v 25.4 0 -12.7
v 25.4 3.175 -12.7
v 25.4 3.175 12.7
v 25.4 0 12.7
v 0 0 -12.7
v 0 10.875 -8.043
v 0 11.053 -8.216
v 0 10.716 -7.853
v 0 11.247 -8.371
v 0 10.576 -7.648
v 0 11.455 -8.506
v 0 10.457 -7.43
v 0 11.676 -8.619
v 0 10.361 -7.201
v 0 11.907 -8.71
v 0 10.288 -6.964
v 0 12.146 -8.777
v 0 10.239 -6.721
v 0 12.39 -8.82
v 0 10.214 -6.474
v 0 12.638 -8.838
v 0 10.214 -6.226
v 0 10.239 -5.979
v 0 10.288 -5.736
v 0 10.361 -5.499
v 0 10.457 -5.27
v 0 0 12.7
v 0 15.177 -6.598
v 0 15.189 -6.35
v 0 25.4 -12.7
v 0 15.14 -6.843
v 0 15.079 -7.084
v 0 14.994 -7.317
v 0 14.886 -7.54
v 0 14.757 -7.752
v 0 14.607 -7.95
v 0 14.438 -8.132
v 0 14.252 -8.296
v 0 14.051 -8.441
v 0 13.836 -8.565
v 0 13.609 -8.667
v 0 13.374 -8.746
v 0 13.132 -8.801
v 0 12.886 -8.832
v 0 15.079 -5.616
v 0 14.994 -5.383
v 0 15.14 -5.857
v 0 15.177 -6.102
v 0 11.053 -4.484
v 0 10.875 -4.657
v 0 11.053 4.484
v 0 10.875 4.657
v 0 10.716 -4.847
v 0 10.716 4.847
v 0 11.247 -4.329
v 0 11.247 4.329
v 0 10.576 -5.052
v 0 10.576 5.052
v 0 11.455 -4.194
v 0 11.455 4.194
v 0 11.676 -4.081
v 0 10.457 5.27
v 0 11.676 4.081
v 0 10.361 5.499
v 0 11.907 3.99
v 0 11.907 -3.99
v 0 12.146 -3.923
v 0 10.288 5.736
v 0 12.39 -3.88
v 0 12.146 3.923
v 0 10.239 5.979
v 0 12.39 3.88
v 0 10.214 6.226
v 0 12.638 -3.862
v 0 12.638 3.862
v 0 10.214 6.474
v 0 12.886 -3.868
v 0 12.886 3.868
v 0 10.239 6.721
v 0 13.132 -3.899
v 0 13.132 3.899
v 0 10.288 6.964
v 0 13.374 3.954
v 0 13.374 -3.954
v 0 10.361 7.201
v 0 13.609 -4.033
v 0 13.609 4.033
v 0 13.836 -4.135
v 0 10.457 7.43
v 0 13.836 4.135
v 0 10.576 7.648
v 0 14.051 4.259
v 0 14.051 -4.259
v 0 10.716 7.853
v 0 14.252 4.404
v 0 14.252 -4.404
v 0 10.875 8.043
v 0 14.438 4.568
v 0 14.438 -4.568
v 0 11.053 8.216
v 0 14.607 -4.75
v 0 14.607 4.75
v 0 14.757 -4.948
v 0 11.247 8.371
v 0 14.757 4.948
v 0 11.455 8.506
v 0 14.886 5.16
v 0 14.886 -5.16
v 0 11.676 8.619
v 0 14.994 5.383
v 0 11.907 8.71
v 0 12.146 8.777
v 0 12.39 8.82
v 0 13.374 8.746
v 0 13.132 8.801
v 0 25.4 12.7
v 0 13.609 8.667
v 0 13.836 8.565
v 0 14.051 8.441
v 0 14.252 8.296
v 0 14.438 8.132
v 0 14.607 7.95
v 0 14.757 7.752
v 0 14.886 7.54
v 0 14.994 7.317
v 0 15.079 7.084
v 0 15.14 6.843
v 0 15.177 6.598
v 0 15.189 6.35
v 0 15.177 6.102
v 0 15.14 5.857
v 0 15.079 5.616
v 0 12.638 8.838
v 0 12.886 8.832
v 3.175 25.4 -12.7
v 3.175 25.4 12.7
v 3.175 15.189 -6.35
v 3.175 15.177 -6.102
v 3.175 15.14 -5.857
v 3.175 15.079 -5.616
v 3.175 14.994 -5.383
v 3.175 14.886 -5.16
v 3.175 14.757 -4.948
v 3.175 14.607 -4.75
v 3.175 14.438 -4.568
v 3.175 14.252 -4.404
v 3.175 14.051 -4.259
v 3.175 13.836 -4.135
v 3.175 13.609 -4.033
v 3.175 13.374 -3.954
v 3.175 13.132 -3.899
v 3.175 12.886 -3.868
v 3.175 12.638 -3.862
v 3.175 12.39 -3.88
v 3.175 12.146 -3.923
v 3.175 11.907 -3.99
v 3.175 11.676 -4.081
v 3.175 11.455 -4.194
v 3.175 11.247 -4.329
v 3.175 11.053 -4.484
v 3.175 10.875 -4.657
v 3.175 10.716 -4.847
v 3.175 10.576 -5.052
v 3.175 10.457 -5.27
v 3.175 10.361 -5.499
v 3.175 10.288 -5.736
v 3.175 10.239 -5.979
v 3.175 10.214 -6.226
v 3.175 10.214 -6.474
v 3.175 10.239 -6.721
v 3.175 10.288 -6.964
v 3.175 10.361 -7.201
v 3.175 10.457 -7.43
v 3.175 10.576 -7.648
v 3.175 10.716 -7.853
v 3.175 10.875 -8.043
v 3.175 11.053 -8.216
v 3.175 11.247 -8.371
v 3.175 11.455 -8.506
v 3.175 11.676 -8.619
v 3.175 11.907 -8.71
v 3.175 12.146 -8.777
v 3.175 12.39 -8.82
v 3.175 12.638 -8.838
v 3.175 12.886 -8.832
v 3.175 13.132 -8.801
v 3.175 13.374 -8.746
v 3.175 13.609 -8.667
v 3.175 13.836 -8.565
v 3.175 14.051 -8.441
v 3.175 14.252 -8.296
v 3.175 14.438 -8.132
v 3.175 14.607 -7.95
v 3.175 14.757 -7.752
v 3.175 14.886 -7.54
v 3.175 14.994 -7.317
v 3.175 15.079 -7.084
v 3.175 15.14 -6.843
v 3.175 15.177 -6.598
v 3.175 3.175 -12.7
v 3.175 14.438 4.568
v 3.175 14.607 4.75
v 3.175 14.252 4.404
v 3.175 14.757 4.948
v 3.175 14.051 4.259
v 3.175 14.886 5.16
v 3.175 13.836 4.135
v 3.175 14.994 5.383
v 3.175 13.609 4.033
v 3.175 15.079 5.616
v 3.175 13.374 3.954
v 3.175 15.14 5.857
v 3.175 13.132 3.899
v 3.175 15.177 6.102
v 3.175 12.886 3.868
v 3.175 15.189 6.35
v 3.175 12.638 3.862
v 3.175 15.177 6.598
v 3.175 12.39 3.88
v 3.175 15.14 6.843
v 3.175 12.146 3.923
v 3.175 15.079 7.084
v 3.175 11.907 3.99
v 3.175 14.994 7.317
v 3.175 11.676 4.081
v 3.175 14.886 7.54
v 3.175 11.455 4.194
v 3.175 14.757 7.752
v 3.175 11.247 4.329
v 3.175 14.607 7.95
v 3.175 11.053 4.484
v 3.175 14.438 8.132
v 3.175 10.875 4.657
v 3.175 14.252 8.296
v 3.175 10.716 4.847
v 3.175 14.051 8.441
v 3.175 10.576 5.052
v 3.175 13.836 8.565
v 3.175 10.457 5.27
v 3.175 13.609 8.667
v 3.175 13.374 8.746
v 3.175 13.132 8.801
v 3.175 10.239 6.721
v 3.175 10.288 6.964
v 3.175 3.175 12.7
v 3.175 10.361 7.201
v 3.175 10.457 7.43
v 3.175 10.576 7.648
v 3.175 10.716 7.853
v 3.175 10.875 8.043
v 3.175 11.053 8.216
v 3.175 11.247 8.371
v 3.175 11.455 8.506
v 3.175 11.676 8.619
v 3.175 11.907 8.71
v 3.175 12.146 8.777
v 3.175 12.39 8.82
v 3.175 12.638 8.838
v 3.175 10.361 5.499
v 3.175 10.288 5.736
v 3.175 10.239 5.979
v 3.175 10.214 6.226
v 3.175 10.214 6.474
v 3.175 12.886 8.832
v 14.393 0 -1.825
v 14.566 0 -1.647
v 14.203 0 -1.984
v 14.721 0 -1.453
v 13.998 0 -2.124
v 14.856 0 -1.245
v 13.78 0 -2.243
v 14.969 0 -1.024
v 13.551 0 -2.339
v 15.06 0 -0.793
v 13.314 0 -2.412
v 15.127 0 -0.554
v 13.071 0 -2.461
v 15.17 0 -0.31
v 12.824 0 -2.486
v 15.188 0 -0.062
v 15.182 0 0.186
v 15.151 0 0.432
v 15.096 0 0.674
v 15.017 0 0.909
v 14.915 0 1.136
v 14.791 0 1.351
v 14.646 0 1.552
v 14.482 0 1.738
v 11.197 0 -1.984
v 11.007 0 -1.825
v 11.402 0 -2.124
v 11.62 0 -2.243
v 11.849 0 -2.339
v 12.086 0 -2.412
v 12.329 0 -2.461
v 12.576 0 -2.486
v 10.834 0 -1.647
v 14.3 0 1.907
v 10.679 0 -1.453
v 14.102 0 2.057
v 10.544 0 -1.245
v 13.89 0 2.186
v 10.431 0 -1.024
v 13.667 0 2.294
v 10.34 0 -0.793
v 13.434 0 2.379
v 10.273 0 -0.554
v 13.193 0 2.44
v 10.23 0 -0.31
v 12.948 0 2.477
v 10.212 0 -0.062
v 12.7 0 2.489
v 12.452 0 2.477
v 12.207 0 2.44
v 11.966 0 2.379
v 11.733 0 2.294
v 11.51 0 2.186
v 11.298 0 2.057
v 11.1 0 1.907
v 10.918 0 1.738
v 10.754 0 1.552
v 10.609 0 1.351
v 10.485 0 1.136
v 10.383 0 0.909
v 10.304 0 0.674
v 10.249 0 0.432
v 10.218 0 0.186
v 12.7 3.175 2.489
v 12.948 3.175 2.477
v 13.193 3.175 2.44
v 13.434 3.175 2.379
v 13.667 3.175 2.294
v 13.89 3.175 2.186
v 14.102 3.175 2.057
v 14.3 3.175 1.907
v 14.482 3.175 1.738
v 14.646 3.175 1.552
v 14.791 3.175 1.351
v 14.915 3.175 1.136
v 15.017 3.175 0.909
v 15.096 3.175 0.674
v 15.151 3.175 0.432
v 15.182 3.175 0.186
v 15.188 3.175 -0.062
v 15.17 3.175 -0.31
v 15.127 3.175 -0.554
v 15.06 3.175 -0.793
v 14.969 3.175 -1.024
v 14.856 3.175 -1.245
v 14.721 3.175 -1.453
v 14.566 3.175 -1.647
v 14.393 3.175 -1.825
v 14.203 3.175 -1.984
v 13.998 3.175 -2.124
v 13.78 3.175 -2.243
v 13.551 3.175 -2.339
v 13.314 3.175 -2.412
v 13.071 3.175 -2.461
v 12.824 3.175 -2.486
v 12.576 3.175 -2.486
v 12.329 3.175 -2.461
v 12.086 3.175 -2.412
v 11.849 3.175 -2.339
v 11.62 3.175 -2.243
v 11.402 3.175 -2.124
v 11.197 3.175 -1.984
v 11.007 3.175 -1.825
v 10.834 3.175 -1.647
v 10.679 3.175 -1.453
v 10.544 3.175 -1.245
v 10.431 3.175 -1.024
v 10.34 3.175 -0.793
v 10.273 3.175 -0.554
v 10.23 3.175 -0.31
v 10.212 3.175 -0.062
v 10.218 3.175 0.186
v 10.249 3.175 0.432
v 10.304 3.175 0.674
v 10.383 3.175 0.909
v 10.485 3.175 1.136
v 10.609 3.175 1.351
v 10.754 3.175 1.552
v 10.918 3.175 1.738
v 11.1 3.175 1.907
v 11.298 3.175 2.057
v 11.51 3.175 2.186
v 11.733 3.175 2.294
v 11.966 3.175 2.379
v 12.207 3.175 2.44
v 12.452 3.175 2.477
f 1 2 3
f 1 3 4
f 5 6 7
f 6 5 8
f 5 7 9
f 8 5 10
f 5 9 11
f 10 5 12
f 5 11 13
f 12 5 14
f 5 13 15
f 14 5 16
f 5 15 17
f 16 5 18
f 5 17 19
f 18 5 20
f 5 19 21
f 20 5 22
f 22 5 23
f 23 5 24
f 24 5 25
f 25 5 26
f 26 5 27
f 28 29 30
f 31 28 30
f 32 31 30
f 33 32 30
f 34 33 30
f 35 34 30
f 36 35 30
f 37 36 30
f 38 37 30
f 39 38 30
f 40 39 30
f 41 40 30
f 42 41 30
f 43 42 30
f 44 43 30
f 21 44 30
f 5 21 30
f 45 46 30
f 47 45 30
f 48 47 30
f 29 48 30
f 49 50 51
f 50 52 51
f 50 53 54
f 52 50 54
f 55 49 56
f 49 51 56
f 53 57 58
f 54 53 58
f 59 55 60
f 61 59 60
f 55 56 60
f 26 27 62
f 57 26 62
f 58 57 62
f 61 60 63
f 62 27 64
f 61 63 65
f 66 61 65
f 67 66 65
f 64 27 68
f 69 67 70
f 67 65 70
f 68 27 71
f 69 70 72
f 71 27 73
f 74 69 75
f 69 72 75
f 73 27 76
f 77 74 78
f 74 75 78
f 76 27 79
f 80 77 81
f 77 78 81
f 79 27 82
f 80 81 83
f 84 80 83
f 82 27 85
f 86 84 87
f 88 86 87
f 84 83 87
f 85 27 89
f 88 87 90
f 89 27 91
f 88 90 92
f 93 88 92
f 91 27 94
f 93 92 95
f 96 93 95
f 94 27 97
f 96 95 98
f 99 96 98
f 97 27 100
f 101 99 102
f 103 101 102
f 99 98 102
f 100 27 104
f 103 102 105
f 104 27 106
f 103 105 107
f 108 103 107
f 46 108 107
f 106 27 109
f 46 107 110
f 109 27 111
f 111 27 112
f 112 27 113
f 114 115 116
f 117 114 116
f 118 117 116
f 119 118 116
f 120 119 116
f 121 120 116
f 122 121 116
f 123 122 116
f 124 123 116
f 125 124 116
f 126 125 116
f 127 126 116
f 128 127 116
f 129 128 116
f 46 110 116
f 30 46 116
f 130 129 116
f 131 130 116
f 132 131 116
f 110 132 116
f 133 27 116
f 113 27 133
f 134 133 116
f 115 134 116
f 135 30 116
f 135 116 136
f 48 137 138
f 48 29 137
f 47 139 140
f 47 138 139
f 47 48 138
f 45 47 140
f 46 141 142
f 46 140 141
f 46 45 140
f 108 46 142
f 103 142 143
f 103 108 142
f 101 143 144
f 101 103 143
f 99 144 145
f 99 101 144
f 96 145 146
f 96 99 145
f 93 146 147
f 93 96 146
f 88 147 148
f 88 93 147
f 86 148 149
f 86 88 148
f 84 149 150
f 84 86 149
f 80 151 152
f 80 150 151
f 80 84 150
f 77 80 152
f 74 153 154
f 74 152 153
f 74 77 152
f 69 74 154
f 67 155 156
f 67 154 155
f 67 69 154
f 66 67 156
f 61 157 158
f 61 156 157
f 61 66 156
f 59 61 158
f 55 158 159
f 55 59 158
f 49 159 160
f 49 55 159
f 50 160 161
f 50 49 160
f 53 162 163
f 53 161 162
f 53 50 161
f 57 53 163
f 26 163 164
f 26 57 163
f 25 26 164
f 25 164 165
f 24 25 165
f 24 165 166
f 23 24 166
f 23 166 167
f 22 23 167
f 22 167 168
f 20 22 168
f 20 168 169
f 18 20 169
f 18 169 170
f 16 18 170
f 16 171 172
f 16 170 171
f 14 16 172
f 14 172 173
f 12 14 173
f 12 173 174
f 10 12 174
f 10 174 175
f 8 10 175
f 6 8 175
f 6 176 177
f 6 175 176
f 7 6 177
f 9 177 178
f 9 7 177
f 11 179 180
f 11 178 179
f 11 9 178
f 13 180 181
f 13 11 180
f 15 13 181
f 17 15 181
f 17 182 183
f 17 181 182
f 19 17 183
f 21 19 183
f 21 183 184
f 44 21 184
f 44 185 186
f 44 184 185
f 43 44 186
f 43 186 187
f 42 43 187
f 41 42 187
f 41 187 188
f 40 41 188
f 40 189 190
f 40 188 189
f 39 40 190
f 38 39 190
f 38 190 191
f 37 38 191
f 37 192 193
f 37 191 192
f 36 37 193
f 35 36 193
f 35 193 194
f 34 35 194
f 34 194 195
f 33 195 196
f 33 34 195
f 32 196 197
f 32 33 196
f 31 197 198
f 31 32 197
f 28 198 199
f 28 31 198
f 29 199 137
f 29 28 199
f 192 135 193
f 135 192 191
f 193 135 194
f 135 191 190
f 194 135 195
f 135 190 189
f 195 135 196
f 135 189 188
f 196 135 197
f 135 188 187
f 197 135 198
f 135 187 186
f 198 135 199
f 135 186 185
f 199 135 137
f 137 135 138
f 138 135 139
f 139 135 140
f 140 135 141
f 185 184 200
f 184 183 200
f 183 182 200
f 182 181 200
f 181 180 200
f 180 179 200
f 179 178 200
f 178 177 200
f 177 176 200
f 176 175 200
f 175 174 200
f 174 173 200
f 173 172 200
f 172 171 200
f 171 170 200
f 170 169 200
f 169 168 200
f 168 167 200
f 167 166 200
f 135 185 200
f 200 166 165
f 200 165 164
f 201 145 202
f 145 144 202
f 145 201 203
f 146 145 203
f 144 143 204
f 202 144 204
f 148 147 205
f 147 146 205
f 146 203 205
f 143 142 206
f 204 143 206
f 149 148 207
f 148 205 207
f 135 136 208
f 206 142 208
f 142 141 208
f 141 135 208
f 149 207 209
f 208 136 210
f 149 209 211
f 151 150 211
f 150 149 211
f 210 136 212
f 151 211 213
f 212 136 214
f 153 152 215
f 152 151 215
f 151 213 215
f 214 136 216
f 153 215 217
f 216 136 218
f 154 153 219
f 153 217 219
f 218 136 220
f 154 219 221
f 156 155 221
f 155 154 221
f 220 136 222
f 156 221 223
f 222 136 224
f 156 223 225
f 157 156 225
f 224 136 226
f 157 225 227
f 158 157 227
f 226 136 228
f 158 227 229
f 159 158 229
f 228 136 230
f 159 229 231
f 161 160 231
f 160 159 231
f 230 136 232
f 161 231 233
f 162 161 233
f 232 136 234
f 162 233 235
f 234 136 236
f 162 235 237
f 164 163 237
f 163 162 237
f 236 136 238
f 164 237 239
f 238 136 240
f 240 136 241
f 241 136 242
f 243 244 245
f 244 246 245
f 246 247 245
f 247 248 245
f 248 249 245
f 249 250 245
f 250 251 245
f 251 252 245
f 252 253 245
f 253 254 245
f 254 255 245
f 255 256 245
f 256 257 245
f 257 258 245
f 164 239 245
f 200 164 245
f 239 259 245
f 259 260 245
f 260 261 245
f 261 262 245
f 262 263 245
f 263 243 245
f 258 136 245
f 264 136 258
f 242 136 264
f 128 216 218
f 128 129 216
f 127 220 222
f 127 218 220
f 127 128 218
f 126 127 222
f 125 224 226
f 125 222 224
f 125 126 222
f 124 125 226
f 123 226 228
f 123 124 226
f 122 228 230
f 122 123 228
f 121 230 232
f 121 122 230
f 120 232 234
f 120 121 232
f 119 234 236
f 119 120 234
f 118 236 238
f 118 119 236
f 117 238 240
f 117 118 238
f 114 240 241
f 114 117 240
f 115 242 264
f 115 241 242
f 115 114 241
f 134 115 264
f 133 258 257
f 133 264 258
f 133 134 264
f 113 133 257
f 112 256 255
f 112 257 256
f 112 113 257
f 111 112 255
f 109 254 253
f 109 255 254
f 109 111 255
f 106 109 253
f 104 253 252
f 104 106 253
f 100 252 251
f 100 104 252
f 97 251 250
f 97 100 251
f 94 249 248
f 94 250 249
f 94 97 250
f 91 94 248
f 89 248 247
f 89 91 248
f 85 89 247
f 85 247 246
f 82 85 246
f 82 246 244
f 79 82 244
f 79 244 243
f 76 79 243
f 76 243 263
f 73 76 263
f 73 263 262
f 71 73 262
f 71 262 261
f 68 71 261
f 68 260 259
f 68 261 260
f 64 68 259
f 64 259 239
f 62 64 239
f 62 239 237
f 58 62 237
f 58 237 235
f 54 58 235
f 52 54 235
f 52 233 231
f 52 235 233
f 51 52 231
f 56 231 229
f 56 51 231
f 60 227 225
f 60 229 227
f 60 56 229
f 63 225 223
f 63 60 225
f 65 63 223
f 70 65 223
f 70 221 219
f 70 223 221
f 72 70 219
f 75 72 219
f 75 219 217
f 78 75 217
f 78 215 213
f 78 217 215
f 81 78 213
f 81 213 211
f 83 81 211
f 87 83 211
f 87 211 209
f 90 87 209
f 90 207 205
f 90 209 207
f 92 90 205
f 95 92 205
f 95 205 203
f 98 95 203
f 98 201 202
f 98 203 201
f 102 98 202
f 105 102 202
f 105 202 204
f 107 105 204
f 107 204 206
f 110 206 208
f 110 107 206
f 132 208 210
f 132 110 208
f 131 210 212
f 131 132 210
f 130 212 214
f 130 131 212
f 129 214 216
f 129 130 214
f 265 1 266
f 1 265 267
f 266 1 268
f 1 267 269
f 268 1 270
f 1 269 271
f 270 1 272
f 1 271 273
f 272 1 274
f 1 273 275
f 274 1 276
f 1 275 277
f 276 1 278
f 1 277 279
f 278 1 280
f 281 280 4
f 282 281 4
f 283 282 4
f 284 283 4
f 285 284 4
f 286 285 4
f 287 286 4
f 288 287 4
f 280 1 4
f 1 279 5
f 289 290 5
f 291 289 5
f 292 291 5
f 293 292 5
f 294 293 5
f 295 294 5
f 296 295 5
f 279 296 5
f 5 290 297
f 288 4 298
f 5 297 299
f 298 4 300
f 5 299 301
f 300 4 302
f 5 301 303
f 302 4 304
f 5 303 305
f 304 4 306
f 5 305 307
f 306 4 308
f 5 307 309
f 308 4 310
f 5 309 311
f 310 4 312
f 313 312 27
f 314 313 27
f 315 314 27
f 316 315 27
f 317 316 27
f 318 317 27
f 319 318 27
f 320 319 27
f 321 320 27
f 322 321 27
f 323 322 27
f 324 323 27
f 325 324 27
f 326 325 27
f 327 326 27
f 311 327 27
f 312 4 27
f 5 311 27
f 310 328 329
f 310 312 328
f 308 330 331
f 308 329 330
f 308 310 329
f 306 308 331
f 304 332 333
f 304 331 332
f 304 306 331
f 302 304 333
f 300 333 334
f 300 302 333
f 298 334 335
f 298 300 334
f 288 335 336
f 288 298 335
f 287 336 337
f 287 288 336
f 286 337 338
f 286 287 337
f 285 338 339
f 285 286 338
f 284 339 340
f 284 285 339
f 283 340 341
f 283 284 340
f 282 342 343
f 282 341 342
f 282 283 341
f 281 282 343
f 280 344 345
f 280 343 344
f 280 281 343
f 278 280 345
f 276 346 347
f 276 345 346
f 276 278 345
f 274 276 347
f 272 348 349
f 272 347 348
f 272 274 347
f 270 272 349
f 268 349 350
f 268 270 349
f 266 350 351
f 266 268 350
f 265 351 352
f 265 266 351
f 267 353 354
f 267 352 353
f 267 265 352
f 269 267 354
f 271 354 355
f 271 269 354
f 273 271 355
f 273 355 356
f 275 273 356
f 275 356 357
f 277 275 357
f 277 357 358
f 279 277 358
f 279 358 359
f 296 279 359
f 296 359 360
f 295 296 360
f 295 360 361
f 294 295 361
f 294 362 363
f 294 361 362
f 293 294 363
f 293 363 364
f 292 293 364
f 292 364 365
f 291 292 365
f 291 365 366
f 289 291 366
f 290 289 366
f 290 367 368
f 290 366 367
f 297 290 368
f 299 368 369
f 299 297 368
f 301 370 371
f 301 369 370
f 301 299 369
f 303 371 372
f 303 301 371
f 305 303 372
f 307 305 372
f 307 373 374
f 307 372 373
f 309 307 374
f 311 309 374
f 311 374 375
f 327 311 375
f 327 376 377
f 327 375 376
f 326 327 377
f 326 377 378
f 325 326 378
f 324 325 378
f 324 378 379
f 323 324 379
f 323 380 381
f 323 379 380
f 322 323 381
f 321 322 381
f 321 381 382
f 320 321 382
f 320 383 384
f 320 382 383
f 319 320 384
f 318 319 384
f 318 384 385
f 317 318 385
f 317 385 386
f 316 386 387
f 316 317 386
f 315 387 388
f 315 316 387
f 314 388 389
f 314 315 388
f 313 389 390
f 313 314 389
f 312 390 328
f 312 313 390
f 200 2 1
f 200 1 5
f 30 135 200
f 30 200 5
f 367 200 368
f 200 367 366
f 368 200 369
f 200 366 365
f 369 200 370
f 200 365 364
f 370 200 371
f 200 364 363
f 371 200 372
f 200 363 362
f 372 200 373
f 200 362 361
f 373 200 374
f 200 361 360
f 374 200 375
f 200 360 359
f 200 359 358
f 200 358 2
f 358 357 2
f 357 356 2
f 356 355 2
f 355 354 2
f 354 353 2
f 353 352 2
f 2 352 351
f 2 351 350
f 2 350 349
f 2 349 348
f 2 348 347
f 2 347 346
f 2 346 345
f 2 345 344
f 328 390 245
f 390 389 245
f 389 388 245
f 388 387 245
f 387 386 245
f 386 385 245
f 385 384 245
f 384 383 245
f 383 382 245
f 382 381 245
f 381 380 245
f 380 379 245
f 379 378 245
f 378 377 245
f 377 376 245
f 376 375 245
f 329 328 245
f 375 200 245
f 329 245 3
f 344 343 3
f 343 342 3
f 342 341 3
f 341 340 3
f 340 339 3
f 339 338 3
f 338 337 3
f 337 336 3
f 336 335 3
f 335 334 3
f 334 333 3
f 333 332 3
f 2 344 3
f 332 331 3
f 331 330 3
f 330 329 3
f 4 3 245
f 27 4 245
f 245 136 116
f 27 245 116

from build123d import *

# Parameters (mm, degrees)
BOSS_EXTRUDE1_DEPTH     = 12.7
CUT_EXTRUDE1_DEPTH      = 37.061067996
CUT_EXTRUDE1_DEPTH_BACK = 37.061067996
SKETCH3_R               = 2.4892
CUT_EXTRUDE2_DEPTH      = 37.061067996
CUT_EXTRUDE2_DEPTH_BACK = 37.061067996
SKETCH4_R               = 2.4892


with BuildPart() as part:
    # Sketch1 → Boss-Extrude1 (new, symmetric)
    with BuildSketch(Plane.XY):
        Polygon((0, 0), (0, 25.4), (3.175, 25.4), (3.175, 3.175), (25.4, 3.175), (25.4, 0), align=None)
    extrude(amount=BOSS_EXTRUDE1_DEPTH, both=True)

    # Sketch3 → Cut-Extrude1 (cut, two sides: drawn at the far end of the back side and taken through both)
    with BuildSketch(Plane(origin=(0, 3.175, 0), x_dir=(1, 0, 0), z_dir=(0, 1, 0)).offset(-CUT_EXTRUDE1_DEPTH_BACK)):
        with Locations(Location((12.7, 0, 0), (0, 0, 270))):
            Circle(SKETCH3_R)
    extrude(amount=CUT_EXTRUDE1_DEPTH + CUT_EXTRUDE1_DEPTH_BACK, mode=Mode.SUBTRACT)

    # Sketch4 → Cut-Extrude2 (cut, two sides: drawn at the far end of the back side and taken through both)
    with BuildSketch(Plane(origin=(3.175, 0, 0), x_dir=(0, 0, -1), z_dir=(1, 0, 0)).offset(-CUT_EXTRUDE2_DEPTH_BACK)):
        with Locations(Location((-6.35, 12.7, 0), (0, 0, 90))):
            Circle(SKETCH4_R)
        with Locations(Location((6.35, 12.7, 0), (0, 0, 90))):
            Circle(SKETCH4_R)
    extrude(amount=CUT_EXTRUDE2_DEPTH + CUT_EXTRUDE2_DEPTH_BACK, mode=Mode.SUBTRACT)


solid = part.part
